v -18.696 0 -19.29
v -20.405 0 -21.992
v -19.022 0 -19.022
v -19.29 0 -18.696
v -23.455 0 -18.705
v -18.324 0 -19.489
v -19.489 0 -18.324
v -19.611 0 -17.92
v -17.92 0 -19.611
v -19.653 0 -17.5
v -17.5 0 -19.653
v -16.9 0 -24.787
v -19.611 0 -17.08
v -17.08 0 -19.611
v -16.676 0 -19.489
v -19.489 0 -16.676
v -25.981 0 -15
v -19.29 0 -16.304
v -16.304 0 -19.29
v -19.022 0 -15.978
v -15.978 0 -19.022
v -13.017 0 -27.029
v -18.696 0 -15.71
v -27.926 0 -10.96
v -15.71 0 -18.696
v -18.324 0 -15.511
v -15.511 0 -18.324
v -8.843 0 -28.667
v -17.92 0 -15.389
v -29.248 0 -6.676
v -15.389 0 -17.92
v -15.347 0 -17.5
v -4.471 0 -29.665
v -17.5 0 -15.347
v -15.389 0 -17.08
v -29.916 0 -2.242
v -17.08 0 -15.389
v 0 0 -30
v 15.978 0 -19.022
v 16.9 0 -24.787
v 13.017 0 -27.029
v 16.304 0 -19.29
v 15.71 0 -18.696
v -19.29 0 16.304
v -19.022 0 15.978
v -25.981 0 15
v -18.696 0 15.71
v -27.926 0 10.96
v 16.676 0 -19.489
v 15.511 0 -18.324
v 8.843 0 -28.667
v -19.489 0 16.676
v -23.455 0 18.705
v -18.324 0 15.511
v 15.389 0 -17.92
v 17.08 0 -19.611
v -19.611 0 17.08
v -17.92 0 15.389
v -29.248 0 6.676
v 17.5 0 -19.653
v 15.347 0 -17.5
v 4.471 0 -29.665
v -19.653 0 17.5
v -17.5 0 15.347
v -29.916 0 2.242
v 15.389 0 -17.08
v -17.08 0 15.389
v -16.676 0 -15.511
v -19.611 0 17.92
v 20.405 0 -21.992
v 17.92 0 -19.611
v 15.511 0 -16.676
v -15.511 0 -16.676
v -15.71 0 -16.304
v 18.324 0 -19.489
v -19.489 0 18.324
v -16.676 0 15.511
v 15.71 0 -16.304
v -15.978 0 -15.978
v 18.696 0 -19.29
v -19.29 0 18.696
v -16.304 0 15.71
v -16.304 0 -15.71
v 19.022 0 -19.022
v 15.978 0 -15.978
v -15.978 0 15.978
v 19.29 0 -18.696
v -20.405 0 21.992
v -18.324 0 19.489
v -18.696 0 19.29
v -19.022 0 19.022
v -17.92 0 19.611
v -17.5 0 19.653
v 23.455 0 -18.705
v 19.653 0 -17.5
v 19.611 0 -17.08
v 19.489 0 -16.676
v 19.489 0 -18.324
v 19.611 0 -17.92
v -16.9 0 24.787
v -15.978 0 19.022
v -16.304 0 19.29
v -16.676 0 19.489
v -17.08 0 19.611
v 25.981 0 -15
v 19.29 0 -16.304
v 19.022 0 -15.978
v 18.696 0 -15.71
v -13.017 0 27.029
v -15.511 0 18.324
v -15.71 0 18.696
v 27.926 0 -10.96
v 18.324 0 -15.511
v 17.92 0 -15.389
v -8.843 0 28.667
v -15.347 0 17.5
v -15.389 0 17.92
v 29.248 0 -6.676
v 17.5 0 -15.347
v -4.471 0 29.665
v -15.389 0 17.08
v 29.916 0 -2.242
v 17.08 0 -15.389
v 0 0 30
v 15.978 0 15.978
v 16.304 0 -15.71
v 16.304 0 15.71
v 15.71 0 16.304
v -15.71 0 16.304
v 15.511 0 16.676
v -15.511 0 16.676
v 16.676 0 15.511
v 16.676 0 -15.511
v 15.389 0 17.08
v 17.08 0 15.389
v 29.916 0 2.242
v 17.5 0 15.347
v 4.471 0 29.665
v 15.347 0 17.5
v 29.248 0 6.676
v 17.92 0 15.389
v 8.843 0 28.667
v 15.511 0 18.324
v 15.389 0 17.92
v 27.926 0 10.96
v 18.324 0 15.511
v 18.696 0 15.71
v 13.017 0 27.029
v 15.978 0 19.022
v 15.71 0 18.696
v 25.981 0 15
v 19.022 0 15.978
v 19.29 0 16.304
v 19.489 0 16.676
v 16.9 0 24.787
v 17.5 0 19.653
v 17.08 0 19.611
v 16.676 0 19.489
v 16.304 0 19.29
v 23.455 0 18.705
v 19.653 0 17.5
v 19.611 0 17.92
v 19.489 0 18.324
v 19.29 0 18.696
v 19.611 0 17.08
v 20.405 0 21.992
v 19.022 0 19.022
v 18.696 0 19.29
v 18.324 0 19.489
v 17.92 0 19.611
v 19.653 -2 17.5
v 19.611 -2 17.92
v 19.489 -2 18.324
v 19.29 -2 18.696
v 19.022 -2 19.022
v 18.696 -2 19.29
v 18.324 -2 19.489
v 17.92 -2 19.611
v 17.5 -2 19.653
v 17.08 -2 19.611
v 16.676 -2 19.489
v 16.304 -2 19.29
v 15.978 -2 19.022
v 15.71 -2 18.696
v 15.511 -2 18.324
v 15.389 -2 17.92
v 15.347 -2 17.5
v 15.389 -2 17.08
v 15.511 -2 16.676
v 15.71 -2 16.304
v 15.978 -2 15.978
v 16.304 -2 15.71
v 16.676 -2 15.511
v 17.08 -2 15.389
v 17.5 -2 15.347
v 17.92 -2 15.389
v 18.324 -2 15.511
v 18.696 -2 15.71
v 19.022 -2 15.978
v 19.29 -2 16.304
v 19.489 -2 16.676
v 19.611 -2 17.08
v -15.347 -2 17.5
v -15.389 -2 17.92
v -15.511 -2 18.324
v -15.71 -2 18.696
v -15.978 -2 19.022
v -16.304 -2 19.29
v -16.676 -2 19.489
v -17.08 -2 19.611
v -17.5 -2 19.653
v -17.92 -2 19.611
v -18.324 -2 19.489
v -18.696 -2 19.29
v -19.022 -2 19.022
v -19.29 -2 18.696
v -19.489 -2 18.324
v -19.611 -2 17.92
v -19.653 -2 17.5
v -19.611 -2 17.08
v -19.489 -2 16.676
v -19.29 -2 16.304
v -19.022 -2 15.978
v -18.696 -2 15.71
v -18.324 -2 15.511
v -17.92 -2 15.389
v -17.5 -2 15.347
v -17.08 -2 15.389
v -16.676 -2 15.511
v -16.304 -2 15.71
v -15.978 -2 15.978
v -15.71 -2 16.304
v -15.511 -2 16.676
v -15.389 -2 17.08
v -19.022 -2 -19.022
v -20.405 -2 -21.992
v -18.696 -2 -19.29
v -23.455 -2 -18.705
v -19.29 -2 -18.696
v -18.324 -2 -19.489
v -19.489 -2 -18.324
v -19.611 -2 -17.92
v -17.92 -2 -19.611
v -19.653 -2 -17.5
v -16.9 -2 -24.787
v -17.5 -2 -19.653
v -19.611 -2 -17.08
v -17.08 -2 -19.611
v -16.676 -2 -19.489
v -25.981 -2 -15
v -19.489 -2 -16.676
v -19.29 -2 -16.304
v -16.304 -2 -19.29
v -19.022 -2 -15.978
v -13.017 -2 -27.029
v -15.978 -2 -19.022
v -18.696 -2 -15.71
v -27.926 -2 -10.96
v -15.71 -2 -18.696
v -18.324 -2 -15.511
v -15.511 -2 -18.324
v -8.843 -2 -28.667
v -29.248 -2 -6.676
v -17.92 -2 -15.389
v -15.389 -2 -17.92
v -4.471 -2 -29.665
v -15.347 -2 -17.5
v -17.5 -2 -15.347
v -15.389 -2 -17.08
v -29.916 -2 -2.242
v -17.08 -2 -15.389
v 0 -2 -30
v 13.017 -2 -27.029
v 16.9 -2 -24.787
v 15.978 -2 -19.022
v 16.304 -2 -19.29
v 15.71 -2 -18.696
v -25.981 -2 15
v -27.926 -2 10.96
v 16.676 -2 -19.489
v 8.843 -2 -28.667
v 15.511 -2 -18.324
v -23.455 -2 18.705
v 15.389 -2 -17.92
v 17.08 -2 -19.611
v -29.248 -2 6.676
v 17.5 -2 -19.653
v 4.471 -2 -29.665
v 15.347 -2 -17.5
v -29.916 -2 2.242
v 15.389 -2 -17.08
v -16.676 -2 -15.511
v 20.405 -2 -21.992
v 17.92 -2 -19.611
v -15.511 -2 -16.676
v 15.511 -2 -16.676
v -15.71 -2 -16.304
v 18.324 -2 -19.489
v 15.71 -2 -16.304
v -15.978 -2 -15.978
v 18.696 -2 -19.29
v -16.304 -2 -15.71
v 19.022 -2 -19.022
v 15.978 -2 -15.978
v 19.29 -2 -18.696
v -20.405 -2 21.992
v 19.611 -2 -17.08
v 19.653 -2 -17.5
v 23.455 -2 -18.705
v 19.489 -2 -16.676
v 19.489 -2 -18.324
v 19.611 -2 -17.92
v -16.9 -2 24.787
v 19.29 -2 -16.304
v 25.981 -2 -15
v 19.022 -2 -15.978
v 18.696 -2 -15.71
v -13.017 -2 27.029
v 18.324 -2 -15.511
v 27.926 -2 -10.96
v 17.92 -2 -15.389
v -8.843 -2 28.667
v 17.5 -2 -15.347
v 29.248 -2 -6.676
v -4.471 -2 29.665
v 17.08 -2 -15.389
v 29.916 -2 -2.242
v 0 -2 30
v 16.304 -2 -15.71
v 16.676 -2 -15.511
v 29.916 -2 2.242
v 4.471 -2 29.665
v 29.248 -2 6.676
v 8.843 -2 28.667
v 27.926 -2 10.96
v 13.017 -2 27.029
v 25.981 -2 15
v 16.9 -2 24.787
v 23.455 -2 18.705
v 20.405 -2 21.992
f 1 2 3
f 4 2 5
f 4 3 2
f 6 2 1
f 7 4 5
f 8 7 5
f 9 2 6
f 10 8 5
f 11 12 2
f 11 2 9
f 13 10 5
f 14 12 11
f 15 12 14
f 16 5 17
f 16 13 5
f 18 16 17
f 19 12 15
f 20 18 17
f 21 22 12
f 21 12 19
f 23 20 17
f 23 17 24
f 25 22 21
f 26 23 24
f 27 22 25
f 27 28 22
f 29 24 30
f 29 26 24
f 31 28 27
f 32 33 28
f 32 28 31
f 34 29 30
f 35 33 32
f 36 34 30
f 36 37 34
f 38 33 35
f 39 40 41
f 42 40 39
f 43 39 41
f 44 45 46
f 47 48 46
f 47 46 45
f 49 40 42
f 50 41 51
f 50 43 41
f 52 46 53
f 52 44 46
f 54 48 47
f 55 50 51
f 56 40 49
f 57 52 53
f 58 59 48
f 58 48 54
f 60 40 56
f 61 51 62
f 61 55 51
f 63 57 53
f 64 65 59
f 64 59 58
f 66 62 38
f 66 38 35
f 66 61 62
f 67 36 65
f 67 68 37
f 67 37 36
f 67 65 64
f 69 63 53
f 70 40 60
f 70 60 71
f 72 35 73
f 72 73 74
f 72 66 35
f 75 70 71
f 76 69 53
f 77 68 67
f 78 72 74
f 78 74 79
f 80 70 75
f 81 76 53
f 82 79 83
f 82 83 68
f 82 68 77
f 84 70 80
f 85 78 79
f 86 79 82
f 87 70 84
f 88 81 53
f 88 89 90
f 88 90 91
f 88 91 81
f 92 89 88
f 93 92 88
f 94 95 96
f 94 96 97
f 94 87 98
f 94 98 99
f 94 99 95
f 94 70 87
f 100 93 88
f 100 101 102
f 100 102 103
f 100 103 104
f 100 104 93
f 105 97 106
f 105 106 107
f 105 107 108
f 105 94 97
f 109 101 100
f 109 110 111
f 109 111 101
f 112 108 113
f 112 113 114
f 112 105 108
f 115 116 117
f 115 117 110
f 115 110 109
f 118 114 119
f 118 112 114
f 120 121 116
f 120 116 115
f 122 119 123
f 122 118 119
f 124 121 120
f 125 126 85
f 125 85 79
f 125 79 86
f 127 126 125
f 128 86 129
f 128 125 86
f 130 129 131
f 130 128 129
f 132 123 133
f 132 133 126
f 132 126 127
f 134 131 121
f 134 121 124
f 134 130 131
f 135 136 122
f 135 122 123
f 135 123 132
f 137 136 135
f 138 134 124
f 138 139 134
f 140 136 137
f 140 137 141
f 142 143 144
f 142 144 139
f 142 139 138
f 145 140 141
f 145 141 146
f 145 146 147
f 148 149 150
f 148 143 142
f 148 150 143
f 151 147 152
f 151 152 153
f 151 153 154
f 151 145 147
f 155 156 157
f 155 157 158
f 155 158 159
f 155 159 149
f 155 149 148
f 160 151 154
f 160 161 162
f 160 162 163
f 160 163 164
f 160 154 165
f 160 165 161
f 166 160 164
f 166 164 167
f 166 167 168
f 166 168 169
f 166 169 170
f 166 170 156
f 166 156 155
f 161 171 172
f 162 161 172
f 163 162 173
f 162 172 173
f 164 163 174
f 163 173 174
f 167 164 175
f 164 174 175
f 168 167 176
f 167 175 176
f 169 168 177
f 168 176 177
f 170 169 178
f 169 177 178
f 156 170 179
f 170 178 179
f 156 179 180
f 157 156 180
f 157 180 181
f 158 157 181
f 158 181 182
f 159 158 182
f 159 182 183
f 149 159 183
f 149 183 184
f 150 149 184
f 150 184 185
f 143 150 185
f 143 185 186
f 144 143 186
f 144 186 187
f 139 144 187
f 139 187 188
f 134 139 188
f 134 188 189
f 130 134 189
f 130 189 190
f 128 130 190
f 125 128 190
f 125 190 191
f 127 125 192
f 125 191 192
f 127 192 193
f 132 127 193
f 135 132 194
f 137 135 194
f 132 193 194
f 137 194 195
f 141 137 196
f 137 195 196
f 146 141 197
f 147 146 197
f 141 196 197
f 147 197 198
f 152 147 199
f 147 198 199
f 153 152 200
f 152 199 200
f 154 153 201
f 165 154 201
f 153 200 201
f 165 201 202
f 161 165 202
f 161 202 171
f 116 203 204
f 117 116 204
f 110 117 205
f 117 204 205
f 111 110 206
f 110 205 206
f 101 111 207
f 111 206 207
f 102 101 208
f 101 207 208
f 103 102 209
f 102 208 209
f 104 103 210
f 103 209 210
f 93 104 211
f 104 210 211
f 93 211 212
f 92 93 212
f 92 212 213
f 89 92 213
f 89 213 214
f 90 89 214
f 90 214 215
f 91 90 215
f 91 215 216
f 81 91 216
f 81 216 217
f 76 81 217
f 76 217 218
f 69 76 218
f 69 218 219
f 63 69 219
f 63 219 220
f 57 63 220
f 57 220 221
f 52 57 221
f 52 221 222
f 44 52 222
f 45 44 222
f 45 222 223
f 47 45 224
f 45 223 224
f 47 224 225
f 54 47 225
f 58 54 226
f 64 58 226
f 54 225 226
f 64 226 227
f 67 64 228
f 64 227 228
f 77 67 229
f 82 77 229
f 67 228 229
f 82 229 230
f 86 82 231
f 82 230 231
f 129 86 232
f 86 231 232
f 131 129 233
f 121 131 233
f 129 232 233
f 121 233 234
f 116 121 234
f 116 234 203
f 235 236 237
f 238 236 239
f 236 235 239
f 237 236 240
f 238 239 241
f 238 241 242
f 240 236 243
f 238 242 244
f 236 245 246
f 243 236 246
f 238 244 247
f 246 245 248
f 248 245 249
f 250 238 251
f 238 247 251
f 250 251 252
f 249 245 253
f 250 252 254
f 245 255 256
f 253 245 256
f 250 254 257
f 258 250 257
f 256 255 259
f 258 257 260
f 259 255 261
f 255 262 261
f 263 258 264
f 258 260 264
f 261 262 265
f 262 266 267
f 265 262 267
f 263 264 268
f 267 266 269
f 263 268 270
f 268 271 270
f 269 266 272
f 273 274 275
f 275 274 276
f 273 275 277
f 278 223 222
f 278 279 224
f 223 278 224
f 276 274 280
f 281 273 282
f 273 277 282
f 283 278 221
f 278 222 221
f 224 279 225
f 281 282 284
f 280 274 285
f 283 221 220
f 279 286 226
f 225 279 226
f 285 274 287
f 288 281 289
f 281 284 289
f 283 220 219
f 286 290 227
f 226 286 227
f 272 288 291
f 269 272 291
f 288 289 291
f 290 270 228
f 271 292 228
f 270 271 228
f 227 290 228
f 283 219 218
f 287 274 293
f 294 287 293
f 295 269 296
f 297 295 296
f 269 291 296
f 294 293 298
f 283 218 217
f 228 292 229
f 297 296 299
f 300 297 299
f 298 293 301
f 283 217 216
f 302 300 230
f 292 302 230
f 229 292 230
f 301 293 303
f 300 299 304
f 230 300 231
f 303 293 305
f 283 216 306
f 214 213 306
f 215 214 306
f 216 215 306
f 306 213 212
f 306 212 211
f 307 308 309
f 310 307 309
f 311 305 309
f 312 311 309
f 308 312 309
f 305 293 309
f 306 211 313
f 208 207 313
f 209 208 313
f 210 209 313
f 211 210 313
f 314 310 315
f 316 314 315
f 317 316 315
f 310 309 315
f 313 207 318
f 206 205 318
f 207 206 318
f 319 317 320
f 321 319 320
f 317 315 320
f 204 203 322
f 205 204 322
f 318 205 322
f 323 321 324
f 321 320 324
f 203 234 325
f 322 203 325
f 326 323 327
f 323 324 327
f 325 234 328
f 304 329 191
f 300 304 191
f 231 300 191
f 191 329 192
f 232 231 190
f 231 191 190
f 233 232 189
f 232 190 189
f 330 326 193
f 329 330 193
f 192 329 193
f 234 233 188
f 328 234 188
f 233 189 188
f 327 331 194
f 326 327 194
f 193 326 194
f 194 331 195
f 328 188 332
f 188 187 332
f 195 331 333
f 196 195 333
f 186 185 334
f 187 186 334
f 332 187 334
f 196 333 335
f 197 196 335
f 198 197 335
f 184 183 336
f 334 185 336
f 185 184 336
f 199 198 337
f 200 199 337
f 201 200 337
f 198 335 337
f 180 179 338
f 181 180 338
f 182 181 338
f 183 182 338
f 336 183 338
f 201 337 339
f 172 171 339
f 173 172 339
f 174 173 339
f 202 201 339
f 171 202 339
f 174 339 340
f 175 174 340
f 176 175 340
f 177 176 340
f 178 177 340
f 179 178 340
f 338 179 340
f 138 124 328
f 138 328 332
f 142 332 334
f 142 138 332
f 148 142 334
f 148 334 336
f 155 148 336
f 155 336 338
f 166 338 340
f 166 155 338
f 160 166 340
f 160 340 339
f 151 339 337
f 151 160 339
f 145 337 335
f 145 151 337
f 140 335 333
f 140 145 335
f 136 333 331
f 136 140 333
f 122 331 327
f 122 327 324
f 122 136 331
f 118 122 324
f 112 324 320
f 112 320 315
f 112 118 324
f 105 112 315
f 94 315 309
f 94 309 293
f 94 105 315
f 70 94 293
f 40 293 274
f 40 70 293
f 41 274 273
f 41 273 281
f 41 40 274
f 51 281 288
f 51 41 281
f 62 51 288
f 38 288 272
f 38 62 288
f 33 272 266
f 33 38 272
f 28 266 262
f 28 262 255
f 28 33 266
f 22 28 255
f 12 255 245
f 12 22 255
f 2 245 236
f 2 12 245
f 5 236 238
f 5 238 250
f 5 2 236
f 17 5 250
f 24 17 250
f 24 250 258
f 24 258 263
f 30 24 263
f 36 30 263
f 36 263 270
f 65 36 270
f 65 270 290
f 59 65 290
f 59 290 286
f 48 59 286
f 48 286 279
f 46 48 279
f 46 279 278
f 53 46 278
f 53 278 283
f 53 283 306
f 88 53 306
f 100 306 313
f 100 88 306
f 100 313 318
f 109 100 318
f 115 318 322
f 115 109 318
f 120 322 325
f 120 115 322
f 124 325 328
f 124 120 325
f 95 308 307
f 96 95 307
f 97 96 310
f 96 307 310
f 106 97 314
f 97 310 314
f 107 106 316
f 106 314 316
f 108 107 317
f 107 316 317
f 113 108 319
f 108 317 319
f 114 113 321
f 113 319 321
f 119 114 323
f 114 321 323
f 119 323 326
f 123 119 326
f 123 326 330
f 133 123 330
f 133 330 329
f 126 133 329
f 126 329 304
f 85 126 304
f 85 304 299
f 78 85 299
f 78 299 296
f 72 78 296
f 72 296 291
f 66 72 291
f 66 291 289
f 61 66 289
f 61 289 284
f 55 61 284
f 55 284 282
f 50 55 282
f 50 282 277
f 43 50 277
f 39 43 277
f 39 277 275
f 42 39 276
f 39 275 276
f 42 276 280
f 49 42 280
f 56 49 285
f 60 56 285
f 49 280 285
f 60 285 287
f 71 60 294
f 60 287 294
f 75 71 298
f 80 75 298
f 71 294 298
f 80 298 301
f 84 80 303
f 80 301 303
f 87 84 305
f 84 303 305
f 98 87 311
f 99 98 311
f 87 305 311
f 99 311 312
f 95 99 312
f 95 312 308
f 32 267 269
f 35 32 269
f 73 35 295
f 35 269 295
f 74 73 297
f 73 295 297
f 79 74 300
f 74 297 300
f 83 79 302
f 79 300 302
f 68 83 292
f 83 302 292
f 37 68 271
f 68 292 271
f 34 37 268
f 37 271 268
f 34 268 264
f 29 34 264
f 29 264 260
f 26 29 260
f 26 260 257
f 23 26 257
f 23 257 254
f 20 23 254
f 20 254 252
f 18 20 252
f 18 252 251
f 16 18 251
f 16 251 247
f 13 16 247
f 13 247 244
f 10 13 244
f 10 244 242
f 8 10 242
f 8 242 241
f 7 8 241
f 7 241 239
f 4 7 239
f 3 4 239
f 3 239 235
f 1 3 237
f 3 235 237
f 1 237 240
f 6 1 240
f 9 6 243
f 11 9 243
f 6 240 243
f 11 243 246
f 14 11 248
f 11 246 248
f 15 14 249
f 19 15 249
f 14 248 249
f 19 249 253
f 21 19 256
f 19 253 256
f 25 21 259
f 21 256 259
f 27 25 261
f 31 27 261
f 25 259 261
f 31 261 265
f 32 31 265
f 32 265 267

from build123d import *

# Parameters (mm, degrees)
SKETCH2_R             = 30
ACRYLICBASE_DEPTH     = 2
F_8_CLEARANCE_HOLE2_D = 4.3053


with BuildPart() as part:
    # Sketch2 → AcrylicBase (new body)
    with BuildSketch(Plane(origin=(0, 0, 0), x_dir=(1, 0, 0), z_dir=(0, 1, 0))):
        Circle(SKETCH2_R)
    extrude(amount=-ACRYLICBASE_DEPTH)

    # #8 Clearance Hole2 (through all)
    with Locations(Plane(origin=(0, 0, 0), x_dir=(-1, 0, 0), z_dir=(0, 1, 0))):
        with Locations((17.5, -17.5), (-17.5, -17.5), (-17.5, 17.5), (17.5, 17.5)):
            Hole(F_8_CLEARANCE_HOLE2_D / 2)


solid = part.part
